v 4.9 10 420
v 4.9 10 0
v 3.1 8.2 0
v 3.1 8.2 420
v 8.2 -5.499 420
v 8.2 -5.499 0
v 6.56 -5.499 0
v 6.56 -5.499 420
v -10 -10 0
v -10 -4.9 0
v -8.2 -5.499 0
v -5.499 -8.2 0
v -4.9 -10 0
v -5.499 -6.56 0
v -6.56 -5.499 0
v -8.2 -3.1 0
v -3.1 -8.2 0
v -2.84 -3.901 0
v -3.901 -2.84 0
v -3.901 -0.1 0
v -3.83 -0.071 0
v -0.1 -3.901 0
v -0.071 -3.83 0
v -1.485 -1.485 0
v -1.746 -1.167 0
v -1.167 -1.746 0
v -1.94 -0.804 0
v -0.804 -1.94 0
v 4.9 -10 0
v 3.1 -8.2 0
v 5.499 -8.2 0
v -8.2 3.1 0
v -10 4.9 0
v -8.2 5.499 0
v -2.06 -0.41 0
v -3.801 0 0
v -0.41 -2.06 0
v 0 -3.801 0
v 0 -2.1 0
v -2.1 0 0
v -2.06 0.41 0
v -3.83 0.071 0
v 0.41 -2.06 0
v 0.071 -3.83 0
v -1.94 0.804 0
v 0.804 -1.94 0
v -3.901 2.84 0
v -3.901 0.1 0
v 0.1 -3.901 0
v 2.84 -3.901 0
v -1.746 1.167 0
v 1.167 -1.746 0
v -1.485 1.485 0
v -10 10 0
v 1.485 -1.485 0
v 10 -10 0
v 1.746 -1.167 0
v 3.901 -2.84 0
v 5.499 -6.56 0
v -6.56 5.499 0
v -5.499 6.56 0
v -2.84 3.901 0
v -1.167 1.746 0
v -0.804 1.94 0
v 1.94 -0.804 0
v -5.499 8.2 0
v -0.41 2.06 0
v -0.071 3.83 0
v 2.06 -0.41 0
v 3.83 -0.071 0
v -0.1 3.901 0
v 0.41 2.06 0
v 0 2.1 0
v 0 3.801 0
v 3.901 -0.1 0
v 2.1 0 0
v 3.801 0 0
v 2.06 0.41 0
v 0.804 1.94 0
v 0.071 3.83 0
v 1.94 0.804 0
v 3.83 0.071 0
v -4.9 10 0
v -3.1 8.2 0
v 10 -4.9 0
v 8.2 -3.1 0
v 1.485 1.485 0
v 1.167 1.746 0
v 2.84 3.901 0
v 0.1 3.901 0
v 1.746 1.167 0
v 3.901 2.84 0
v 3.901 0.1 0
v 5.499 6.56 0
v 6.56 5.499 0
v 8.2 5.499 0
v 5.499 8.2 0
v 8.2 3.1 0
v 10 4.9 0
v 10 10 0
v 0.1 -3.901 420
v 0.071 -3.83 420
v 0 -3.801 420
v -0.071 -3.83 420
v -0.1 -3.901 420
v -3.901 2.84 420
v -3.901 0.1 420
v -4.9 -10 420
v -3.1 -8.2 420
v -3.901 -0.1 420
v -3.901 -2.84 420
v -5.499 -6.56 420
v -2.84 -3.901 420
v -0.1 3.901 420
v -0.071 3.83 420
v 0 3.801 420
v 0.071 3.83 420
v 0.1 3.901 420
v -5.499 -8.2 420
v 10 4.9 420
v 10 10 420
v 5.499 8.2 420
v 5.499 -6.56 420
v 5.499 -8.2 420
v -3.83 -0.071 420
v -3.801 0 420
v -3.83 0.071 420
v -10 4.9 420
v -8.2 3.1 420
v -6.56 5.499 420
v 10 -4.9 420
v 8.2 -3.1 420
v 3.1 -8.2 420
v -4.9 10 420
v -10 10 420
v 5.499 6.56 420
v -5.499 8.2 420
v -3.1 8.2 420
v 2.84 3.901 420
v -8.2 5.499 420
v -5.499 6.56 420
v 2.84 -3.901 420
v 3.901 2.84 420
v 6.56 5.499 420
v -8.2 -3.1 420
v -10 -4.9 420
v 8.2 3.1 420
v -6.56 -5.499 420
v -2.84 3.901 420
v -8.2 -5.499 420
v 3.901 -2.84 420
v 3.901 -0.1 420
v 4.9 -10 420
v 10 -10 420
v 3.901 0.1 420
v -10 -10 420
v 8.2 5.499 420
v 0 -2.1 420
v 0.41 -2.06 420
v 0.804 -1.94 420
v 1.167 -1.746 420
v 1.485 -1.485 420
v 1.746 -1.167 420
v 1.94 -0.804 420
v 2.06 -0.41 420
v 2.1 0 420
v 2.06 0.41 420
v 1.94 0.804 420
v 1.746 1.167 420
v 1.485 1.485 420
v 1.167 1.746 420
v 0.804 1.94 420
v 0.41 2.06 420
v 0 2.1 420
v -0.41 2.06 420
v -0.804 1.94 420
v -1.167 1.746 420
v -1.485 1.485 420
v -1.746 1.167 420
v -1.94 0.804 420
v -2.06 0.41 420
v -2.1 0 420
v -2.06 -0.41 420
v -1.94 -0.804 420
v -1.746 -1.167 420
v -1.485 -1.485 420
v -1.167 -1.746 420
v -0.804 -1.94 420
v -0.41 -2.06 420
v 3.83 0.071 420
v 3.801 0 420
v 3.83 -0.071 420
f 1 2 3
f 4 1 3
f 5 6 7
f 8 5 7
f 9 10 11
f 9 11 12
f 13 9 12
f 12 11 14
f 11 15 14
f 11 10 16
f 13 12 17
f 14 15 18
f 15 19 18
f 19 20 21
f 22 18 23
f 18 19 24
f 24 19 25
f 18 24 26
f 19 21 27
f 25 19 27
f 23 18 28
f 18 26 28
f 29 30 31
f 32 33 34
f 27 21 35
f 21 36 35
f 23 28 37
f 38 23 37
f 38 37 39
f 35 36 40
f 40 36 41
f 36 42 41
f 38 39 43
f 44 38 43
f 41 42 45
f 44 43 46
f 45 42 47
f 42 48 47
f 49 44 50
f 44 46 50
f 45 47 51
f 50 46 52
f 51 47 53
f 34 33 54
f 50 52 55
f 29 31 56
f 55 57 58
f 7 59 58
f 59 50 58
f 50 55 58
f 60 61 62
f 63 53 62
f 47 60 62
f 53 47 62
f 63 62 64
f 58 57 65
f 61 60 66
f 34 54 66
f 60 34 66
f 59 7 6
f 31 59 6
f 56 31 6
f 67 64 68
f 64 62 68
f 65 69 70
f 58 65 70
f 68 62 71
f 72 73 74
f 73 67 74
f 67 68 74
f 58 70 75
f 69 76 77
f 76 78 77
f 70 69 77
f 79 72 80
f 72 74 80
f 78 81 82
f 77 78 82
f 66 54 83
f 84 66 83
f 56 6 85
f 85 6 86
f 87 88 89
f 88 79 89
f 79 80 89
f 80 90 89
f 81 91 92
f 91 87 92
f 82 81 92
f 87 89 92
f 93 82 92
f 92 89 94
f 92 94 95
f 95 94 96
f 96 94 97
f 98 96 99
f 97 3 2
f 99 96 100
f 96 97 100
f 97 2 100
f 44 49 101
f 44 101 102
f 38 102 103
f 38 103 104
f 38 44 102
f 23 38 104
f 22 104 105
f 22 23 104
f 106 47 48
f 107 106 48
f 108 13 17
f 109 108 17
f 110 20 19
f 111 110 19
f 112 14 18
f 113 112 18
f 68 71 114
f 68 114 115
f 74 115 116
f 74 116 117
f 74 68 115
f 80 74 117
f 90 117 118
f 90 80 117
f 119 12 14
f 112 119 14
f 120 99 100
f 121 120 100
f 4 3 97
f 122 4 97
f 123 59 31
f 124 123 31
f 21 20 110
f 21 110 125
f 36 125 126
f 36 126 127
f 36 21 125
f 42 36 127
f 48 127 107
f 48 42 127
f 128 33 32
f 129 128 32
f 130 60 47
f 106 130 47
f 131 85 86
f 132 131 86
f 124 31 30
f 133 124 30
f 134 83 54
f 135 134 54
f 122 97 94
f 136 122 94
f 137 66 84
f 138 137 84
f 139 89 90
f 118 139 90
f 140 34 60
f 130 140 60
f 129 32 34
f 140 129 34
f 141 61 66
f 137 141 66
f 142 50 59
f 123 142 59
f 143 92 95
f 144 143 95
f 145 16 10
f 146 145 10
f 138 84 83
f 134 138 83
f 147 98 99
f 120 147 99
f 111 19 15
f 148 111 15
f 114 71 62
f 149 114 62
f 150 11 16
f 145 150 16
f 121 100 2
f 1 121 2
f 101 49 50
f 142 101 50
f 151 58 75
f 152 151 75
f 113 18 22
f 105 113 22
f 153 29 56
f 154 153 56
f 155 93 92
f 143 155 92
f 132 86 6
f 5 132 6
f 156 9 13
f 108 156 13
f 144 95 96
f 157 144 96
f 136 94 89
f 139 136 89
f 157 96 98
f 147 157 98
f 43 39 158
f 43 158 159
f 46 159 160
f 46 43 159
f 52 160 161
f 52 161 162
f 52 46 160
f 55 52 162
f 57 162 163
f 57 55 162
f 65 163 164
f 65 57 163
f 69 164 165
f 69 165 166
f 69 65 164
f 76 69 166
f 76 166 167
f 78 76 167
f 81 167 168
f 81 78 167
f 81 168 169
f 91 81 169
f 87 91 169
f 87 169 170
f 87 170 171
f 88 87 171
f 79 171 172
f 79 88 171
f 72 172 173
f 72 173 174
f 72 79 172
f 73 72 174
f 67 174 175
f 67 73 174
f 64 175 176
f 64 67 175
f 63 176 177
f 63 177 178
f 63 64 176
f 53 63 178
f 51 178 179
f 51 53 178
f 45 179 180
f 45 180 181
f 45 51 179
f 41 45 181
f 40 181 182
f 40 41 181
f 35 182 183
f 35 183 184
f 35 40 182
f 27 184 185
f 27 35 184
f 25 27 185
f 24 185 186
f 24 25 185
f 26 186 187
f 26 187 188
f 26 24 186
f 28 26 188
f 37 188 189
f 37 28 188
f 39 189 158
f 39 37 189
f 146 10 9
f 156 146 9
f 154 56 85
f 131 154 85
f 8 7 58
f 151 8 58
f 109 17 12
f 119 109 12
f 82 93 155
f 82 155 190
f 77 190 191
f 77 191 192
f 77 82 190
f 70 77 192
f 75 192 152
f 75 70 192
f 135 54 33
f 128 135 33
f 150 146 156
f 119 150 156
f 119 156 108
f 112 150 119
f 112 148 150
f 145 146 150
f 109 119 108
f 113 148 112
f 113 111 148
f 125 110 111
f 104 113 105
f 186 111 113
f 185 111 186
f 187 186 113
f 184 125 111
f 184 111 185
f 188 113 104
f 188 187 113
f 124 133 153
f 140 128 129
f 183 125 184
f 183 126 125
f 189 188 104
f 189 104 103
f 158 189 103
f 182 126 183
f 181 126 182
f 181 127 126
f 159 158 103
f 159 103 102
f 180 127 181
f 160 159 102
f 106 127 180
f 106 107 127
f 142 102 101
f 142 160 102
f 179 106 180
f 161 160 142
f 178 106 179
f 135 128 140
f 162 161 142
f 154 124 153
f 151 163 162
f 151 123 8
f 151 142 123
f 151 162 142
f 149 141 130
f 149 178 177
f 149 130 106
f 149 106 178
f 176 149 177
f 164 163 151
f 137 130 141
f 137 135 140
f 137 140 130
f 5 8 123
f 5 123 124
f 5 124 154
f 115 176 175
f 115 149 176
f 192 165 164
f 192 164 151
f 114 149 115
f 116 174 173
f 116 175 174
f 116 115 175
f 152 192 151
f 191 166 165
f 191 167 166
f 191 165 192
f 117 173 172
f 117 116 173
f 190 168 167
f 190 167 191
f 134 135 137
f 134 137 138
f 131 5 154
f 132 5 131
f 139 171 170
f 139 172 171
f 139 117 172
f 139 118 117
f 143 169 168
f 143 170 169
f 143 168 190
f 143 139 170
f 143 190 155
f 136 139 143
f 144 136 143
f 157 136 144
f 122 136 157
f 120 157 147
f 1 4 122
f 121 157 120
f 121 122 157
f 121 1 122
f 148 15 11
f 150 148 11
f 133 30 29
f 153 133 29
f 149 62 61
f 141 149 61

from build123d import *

# Parameters (mm, degrees)
SKETCH1_R           = 2.1
BOSS_EXTRUDE1_DEPTH = 420
CUT_EXTRUDE1_DEPTH  = 420


# Read off the part's stored shape, not the designer's step: Cut-Extrude1
with BuildPart() as part:
    # Sketch1 → Boss-Extrude1 (new body)
    with BuildSketch(Plane.XY):
        Polygon((-10, -4.9), (-10, -10), (-4.9, -10), (-3.1, -8.2), (-5.499339828, -8.2), (-5.499339828, -6.56), (-2.84, -3.900660172), (2.84, -3.900660172), (5.499339828, -6.56), (5.499339828, -8.2), (3.1, -8.2), (4.9, -10), (10, -10), (10, -4.9), (8.2, -3.1), (8.2, -5.499339828), (6.56, -5.499339828), (3.900660172, -2.84), (3.900660172, 2.84), (6.56, 5.499339828), (8.2, 5.499339828), (8.2, 3.1), (10, 4.9), (10, 10), (4.9, 10), (3.1, 8.2), (5.499339828, 8.2), (5.499339828, 6.56), (2.84, 3.900660172), (-2.84, 3.900660172), (-5.499339828, 6.56), (-5.499339828, 8.2), (-3.1, 8.2), (-4.9, 10), (-10, 10), (-10, 4.9), (-8.2, 3.1), (-8.2, 5.499339828), (-6.56, 5.499339828), (-3.900660172, 2.84), (-3.900660172, -2.84), (-6.56, -5.499339828), (-8.2, -5.499339828), (-8.2, -3.1), align=None)
        with Locations(Location((0, 0, 0), (0, 0, 270))):
            Circle(SKETCH1_R, mode=Mode.SUBTRACT)
    extrude(amount=BOSS_EXTRUDE1_DEPTH)

    # Cut-Extrude1 outline → Cut-Extrude1 (cut)
    with BuildSketch(Plane.XY):
        with BuildLine():
            ThreePointArc((3.900660172, 0.1), (3.800660172, 0), (3.900660172, -0.1))
            Line((3.900660172, -0.1), (3.900660172, 0.1))
        make_face()
        with BuildLine():
            ThreePointArc((0.1, -3.900660172), (0, -3.800660172), (-0.1, -3.900660172))
            Line((-0.1, -3.900660172), (0.1, -3.900660172))
        make_face()
        with BuildLine():
            ThreePointArc((-3.900660172, -0.1), (-3.800660172, 0), (-3.900660172, 0.1))
            Line((-3.900660172, 0.1), (-3.900660172, -0.1))
        make_face()
        with BuildLine():
            ThreePointArc((-0.1, 3.900660172), (0, 3.800660172), (0.1, 3.900660172))
            Line((0.1, 3.900660172), (-0.1, 3.900660172))
        make_face()
    extrude(amount=CUT_EXTRUDE1_DEPTH, mode=Mode.SUBTRACT)


solid = part.part
